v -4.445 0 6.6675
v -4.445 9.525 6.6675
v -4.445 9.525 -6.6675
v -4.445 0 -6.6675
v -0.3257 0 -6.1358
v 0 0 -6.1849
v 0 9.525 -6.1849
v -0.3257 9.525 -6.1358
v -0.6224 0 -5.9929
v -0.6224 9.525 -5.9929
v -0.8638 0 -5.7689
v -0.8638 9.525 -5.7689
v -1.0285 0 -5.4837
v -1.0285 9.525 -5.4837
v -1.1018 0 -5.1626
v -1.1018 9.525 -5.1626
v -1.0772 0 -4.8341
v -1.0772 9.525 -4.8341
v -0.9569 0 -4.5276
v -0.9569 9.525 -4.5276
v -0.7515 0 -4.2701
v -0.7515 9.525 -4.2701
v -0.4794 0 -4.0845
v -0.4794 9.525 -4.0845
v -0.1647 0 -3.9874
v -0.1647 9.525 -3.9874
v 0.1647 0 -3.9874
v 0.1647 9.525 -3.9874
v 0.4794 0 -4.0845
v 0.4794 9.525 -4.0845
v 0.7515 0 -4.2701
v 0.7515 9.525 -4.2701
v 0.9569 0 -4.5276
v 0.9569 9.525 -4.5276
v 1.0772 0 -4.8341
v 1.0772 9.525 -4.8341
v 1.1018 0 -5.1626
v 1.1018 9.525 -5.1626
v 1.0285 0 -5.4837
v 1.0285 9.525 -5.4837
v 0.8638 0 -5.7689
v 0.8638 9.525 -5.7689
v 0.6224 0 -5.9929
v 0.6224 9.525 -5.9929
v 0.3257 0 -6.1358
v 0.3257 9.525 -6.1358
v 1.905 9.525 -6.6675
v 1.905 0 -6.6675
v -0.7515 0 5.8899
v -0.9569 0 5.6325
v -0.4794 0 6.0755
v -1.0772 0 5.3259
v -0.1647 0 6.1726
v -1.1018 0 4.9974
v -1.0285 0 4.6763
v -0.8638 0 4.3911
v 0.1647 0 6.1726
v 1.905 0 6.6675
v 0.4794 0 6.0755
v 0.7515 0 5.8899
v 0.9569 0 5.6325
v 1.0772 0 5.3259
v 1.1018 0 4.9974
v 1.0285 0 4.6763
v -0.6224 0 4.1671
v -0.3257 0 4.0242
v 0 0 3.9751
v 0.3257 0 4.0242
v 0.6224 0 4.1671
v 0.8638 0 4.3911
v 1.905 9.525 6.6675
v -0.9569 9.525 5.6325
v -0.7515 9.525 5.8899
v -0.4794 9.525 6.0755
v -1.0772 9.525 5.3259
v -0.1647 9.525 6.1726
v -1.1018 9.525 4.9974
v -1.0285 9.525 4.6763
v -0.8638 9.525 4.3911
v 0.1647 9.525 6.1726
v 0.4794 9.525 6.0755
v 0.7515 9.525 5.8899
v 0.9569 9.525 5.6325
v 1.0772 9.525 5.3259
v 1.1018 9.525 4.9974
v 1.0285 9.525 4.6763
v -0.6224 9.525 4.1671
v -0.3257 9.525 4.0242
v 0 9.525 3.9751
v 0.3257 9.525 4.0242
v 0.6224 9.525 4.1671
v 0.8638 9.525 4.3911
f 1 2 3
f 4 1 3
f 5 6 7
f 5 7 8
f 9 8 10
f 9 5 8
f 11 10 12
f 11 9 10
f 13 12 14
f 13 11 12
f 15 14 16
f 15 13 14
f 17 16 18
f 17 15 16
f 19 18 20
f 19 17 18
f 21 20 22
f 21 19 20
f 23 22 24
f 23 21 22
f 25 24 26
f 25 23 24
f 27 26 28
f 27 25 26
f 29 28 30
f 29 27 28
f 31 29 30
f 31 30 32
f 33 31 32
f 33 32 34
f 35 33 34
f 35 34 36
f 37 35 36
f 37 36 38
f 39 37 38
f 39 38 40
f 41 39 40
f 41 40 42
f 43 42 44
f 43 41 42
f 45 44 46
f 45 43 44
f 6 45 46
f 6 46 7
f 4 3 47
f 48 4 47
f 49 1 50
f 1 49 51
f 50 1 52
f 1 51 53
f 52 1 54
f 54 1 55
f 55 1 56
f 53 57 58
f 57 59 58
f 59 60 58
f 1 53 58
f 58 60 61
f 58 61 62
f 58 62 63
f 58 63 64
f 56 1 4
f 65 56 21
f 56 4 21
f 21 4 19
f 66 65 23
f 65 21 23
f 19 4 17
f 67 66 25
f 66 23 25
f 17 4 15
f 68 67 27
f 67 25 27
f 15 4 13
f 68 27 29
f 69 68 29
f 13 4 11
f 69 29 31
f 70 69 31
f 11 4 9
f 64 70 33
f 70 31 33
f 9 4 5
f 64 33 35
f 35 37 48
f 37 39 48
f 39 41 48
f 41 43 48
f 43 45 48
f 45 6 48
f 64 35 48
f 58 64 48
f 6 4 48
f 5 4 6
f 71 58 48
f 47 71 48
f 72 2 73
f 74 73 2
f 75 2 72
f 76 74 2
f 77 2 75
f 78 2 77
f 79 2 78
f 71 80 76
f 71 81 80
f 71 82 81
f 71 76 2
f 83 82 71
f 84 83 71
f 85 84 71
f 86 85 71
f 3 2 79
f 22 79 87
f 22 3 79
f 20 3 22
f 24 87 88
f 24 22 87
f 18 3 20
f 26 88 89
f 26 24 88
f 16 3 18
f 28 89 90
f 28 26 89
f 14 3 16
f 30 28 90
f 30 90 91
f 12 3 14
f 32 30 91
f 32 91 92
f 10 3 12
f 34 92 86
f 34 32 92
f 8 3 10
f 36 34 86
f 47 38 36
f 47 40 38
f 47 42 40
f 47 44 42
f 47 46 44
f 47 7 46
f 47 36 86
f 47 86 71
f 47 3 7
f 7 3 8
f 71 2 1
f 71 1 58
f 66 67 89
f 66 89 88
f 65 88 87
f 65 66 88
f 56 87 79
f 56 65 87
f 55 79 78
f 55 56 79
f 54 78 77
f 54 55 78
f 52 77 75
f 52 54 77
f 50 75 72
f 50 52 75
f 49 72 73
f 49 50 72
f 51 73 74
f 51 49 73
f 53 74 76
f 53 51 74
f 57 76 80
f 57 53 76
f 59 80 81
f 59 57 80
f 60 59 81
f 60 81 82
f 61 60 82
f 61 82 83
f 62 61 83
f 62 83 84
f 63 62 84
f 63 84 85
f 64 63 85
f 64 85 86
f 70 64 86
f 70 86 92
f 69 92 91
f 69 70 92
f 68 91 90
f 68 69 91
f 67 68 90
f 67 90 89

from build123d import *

# Parameters (mm, degrees)
SKETCH1_W           = 3.81
SKETCH1_H           = 13.335
SKETCH1_R           = 1.1049
BOSS_EXTRUDE1_DEPTH = 9.525
SKETCH2_W           = 2.54
SKETCH2_H           = 13.335
BOSS_EXTRUDE2_DEPTH = 9.525


with BuildPart() as part:
    # Sketch1 → Boss-Extrude1 (new body)
    with BuildSketch(Plane(origin=(0, 0, 0), x_dir=(1, 0, 0), z_dir=(0, 1, 0))):
        Rectangle(SKETCH1_W, SKETCH1_H)
        with Locations(Location((0, 5.08, 0), (0, 0, 90))):
            Circle(SKETCH1_R, mode=Mode.SUBTRACT)
        with Locations(Location((0, -5.08, 0), (0, 0, 90))):
            Circle(SKETCH1_R, mode=Mode.SUBTRACT)
    extrude(amount=BOSS_EXTRUDE1_DEPTH)

    # Sketch2 → Boss-Extrude2 (add)
    with BuildSketch(Plane(origin=(0, 9.525, 0), x_dir=(1, 0, 0), z_dir=(0, 1, 0))):
        with Locations((-3.175, 0)):
            Rectangle(SKETCH2_W, SKETCH2_H)
    extrude(amount=-BOSS_EXTRUDE2_DEPTH)


solid = part.part
